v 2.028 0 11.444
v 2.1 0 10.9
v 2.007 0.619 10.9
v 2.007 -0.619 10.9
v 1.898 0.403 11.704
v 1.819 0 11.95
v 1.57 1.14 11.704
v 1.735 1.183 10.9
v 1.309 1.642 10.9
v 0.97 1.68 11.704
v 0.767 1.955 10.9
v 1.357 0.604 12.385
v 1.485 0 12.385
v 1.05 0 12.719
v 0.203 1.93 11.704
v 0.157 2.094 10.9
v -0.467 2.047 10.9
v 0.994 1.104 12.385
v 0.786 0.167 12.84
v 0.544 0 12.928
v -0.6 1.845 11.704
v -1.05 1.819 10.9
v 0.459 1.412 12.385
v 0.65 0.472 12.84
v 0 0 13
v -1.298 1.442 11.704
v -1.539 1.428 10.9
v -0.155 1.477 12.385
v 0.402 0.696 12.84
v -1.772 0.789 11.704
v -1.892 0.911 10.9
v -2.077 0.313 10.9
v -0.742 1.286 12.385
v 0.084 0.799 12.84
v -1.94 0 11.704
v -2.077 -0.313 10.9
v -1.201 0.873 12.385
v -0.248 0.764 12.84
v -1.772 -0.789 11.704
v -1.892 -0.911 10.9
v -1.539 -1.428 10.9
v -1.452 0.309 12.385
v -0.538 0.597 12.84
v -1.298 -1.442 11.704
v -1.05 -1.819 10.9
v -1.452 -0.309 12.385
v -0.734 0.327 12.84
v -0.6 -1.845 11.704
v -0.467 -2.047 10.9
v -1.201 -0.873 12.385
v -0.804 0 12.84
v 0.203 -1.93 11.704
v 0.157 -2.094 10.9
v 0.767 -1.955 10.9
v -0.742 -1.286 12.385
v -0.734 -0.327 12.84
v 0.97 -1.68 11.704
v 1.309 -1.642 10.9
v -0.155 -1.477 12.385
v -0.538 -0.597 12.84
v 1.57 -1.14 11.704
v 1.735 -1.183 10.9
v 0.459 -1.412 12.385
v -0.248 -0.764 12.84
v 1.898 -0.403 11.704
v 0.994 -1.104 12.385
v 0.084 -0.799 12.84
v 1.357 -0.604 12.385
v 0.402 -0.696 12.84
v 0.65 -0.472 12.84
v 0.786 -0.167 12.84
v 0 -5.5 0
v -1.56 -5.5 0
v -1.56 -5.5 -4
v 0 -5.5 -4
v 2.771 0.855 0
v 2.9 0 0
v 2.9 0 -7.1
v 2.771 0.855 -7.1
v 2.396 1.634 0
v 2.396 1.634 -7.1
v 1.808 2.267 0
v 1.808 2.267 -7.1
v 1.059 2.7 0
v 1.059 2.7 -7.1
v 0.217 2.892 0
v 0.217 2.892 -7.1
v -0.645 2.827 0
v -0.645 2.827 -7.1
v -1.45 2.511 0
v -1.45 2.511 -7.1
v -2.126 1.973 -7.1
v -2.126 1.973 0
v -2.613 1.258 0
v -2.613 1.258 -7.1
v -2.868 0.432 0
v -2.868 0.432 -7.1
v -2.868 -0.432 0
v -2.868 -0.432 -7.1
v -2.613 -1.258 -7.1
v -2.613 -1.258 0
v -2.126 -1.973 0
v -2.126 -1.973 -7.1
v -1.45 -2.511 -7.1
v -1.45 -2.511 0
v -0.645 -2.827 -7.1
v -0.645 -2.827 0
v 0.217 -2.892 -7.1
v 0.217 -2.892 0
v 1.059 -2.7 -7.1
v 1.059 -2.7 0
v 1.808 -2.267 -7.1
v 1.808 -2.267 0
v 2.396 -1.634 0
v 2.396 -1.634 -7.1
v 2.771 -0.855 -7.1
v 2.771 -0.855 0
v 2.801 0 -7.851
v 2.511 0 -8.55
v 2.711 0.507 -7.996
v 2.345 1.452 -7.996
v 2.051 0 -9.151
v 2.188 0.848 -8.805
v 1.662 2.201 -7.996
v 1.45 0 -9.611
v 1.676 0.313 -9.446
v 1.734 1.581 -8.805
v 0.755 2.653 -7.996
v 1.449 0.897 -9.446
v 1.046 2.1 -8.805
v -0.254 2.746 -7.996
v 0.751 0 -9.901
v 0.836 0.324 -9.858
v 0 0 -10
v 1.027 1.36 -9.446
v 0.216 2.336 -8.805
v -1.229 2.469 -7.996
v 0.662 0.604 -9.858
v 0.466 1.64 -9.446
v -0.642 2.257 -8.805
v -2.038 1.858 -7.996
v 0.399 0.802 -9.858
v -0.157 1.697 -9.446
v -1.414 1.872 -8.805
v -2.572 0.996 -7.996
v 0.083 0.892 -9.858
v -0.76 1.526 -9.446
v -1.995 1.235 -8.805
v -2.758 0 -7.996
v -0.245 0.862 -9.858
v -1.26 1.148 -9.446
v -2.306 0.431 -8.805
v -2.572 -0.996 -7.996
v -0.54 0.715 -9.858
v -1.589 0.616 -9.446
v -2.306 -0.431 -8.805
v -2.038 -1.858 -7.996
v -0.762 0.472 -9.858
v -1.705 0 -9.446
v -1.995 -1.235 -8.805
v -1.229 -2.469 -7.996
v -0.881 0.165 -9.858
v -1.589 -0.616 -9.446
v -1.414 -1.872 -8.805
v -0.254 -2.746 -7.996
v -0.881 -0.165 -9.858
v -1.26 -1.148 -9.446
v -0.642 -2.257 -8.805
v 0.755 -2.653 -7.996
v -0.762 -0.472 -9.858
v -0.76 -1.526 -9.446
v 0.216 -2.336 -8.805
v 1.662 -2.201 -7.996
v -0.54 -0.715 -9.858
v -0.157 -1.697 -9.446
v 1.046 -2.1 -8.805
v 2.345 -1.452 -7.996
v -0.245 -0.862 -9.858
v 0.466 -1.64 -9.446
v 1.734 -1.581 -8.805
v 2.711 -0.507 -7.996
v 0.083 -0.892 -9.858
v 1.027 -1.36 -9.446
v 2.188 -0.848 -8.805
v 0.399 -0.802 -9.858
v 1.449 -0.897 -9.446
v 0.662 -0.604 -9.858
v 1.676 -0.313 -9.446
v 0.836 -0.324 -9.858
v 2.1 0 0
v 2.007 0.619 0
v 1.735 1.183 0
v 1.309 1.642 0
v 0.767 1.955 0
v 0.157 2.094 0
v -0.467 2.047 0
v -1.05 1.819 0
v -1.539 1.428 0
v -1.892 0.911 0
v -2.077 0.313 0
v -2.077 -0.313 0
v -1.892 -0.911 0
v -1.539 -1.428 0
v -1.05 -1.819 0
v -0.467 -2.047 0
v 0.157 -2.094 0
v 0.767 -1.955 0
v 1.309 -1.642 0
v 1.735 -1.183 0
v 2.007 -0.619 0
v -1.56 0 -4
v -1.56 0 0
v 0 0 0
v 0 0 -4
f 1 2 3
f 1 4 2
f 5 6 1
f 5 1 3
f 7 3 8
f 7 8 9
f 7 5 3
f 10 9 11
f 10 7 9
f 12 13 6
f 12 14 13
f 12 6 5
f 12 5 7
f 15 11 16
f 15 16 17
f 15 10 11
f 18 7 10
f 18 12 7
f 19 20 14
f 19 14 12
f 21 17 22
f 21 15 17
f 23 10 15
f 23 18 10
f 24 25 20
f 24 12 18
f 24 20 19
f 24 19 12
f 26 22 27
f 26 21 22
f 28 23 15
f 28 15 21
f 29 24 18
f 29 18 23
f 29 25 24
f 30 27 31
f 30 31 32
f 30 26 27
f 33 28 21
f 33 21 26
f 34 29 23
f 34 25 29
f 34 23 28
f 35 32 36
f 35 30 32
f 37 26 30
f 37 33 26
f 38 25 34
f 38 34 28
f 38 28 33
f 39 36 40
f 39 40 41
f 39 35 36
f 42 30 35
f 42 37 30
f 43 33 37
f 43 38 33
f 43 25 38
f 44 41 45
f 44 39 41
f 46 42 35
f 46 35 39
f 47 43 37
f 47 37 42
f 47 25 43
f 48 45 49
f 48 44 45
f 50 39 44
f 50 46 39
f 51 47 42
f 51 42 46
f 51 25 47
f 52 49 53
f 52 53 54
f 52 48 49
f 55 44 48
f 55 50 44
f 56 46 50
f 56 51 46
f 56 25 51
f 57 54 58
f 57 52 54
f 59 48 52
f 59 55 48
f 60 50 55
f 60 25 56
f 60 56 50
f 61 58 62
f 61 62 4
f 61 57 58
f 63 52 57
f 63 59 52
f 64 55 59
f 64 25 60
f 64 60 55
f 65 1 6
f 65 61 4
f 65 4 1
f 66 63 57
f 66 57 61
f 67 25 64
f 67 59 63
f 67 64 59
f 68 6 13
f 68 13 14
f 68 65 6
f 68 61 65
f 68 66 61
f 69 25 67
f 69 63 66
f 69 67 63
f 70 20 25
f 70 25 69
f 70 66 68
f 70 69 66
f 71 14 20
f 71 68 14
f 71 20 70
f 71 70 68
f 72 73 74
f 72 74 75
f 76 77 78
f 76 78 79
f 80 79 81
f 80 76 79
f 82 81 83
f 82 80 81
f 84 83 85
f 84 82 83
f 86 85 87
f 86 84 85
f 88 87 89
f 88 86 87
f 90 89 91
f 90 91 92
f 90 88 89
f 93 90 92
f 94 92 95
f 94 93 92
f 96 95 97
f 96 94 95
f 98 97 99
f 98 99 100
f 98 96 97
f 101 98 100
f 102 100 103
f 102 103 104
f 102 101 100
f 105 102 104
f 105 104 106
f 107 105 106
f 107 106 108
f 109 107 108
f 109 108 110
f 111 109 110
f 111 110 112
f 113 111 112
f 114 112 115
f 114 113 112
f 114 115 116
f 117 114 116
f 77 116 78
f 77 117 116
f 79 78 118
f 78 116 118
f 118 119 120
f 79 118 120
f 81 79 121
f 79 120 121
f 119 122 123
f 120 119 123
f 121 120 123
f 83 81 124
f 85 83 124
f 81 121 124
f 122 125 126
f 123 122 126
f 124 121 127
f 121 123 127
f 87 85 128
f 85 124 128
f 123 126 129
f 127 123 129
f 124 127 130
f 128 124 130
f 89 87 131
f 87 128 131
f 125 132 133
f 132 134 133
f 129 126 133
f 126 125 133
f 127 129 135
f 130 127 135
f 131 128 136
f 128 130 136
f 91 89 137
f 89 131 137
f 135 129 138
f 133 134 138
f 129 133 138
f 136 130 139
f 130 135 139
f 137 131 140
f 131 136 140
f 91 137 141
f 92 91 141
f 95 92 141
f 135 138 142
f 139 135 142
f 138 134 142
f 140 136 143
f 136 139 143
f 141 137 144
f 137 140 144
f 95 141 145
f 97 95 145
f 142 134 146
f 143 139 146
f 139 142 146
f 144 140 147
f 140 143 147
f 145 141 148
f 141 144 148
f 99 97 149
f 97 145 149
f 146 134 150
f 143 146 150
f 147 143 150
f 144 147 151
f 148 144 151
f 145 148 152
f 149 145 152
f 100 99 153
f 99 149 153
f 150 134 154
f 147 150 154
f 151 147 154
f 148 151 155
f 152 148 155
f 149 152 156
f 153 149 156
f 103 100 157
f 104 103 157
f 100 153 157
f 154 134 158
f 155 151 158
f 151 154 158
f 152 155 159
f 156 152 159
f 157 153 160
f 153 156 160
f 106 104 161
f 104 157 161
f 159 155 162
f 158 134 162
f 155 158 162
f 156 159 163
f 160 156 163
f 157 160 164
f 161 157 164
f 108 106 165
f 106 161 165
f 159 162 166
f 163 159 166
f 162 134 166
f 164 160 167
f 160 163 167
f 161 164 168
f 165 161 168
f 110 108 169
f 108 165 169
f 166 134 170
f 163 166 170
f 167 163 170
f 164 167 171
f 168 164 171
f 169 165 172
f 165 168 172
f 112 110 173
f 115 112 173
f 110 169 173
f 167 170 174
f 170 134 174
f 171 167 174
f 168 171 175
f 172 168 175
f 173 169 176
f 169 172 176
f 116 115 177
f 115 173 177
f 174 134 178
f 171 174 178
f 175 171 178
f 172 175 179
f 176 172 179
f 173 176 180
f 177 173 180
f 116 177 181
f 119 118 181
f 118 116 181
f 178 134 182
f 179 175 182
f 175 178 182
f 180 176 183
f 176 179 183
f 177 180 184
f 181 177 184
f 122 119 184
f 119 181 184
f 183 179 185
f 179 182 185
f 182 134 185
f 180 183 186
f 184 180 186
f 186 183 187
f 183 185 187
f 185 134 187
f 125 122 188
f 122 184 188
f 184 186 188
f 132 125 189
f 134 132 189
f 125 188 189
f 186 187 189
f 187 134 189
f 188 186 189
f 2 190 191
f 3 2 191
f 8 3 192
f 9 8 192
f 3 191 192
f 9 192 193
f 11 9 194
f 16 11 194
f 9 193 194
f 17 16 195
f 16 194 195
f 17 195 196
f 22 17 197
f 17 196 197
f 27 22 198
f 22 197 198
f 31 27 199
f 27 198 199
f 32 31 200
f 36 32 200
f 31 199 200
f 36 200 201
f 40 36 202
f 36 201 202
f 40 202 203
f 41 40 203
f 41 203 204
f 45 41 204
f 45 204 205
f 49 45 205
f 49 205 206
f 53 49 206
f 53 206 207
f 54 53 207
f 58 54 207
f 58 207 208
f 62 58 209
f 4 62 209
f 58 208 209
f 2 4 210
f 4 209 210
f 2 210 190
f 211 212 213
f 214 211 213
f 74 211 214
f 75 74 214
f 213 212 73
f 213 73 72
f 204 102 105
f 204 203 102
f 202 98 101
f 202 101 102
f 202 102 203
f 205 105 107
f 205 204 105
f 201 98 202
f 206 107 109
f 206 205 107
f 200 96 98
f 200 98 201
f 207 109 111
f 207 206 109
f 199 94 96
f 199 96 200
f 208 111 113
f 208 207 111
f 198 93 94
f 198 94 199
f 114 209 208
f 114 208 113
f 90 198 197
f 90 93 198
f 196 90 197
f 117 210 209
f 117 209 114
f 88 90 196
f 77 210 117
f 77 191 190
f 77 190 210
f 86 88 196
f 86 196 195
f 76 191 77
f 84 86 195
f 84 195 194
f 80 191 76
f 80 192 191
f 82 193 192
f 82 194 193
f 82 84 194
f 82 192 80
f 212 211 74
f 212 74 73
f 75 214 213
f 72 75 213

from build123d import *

# Parameters (mm, degrees)
F0_R     = 2.1
F1_DEPTH = 13
F0_R_2   = 2.9
F2_DEPTH = 10
F3_R     = 2.1
F4_R     = 2.9
F5_W     = 1.56
F5_H     = 4
F6_DEPTH = 5.5


with BuildPart() as f1:
    # F0 (on Top) → F1 (new body)
    with BuildSketch(Plane.XY):
        Circle(F0_R)
    extrude(amount=F1_DEPTH)

    # F0 (on Top) → F2 (join)
    with BuildSketch(Plane.XY):
        Circle(F0_R_2)
        Circle(F0_R, mode=Mode.SUBTRACT)
        Circle(F0_R)
    extrude(amount=-F2_DEPTH)

    # F3
    f3_edges = [f1.edges().sort_by_distance(p)[0] for p in [
        (-2.1, 0, 13),
    ]]
    fillet(f3_edges, radius=F3_R)

    # F4
    f4_edges = [f1.edges().sort_by_distance(p)[0] for p in [
        (-2.9, 0, -10),
    ]]
    fillet(f4_edges, radius=F4_R)


with BuildPart() as f6:
    # F5 (on Front) → F6 (new body)
    with BuildSketch(Plane.XZ):
        with Locations((-0.78, -2)):
            Rectangle(F5_W, F5_H)
    extrude(amount=F6_DEPTH)


solid = Compound([f1.part, f6.part])
